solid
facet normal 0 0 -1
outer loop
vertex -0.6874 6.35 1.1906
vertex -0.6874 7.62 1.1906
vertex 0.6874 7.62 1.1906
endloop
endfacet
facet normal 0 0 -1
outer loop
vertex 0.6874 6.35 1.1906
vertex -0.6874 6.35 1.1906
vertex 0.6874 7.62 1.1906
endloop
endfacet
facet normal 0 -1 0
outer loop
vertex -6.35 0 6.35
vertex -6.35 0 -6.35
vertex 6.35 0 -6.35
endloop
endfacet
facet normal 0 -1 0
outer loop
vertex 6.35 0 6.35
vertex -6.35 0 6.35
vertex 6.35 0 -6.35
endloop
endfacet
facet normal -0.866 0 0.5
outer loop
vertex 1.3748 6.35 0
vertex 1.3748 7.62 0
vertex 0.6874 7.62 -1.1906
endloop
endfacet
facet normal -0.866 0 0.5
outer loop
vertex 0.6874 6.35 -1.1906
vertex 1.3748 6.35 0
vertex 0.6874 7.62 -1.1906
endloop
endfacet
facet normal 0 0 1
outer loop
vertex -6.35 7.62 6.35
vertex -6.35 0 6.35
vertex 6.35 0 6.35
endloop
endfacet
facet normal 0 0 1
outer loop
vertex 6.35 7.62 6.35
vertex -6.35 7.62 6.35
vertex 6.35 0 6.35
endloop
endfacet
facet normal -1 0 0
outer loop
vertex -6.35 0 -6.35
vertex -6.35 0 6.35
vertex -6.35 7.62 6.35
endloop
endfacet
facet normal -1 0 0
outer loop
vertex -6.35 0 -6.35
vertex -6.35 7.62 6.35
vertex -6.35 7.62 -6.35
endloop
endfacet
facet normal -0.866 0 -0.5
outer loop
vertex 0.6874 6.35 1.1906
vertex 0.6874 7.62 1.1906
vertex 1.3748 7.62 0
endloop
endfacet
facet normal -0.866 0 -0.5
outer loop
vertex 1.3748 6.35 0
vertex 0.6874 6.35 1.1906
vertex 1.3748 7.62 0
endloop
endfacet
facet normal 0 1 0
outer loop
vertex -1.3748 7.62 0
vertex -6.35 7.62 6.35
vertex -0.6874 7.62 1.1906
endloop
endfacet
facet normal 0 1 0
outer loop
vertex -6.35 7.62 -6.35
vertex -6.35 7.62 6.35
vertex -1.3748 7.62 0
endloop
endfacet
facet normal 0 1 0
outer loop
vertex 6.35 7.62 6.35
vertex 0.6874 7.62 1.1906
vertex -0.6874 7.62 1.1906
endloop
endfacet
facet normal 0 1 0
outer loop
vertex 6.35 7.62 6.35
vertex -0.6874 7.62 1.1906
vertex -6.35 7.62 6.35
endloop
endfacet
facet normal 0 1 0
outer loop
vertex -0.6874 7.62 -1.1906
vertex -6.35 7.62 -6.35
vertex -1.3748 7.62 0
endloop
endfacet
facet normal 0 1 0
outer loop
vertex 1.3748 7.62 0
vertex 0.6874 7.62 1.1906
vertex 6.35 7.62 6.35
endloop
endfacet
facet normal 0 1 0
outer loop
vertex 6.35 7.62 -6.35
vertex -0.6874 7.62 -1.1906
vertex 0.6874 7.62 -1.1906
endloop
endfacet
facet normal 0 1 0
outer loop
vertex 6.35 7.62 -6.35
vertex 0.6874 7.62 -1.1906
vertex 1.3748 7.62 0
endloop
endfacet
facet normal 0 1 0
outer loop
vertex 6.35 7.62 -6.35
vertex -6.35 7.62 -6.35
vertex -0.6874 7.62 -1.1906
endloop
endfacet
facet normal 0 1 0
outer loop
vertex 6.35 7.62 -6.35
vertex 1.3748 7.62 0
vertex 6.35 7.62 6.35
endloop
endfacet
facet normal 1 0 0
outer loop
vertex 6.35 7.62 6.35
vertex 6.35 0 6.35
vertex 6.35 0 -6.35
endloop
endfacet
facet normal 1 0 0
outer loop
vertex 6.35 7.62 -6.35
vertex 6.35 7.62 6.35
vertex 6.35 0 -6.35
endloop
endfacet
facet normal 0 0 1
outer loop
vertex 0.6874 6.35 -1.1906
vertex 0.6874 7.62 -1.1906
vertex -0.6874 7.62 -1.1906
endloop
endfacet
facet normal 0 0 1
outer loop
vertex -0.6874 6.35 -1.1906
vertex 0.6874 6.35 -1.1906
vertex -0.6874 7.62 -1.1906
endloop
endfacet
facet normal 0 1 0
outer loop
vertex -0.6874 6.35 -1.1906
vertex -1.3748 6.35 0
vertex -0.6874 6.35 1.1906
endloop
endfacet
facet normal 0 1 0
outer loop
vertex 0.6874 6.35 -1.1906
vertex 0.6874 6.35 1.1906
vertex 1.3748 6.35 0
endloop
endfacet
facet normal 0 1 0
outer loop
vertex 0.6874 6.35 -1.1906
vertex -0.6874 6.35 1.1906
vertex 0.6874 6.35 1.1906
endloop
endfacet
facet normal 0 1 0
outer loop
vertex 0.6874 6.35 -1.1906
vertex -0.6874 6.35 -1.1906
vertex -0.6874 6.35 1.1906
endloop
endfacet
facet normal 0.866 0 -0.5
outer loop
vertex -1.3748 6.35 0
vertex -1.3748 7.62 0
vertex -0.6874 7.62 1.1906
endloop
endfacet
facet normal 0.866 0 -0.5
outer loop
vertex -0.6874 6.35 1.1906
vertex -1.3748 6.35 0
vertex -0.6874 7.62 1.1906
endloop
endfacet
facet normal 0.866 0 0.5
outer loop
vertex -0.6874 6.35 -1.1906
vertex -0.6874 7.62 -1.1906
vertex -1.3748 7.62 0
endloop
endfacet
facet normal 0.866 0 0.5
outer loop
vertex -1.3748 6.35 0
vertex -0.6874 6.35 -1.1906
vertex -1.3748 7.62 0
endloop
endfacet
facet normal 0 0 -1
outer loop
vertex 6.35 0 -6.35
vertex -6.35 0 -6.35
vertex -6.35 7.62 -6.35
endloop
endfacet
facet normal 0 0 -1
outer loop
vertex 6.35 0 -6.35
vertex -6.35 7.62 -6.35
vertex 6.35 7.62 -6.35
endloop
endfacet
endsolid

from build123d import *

# Parameters (mm, degrees)
SKETCH1_W           = 12.7
SKETCH1_H           = 12.7
BOSS_EXTRUDE1_DEPTH = 7.62
CUT_EXTRUDE1_DEPTH  = 1.27


with BuildPart() as part:
    # Sketch1 → Boss-Extrude1 (new body)
    with BuildSketch(Plane(origin=(0, 0, 0), x_dir=(1, 0, 0), z_dir=(0, 1, 0))):
        Rectangle(SKETCH1_W, SKETCH1_H)
    extrude(amount=BOSS_EXTRUDE1_DEPTH)

    # Sketch2 → Cut-Extrude1 (cut)
    with BuildSketch(Plane(origin=(0, 7.62, 0), x_dir=(1, 0, 0), z_dir=(0, 1, 0))):
        Polygon((0.687407664, -1.190625), (1.374815329, 0), (0.687407664, 1.190625), (-0.687407664, 1.190625), (-1.374815329, 0), (-0.687407664, -1.190625), align=None)
    extrude(amount=-CUT_EXTRUDE1_DEPTH, mode=Mode.SUBTRACT)


solid = part.part
